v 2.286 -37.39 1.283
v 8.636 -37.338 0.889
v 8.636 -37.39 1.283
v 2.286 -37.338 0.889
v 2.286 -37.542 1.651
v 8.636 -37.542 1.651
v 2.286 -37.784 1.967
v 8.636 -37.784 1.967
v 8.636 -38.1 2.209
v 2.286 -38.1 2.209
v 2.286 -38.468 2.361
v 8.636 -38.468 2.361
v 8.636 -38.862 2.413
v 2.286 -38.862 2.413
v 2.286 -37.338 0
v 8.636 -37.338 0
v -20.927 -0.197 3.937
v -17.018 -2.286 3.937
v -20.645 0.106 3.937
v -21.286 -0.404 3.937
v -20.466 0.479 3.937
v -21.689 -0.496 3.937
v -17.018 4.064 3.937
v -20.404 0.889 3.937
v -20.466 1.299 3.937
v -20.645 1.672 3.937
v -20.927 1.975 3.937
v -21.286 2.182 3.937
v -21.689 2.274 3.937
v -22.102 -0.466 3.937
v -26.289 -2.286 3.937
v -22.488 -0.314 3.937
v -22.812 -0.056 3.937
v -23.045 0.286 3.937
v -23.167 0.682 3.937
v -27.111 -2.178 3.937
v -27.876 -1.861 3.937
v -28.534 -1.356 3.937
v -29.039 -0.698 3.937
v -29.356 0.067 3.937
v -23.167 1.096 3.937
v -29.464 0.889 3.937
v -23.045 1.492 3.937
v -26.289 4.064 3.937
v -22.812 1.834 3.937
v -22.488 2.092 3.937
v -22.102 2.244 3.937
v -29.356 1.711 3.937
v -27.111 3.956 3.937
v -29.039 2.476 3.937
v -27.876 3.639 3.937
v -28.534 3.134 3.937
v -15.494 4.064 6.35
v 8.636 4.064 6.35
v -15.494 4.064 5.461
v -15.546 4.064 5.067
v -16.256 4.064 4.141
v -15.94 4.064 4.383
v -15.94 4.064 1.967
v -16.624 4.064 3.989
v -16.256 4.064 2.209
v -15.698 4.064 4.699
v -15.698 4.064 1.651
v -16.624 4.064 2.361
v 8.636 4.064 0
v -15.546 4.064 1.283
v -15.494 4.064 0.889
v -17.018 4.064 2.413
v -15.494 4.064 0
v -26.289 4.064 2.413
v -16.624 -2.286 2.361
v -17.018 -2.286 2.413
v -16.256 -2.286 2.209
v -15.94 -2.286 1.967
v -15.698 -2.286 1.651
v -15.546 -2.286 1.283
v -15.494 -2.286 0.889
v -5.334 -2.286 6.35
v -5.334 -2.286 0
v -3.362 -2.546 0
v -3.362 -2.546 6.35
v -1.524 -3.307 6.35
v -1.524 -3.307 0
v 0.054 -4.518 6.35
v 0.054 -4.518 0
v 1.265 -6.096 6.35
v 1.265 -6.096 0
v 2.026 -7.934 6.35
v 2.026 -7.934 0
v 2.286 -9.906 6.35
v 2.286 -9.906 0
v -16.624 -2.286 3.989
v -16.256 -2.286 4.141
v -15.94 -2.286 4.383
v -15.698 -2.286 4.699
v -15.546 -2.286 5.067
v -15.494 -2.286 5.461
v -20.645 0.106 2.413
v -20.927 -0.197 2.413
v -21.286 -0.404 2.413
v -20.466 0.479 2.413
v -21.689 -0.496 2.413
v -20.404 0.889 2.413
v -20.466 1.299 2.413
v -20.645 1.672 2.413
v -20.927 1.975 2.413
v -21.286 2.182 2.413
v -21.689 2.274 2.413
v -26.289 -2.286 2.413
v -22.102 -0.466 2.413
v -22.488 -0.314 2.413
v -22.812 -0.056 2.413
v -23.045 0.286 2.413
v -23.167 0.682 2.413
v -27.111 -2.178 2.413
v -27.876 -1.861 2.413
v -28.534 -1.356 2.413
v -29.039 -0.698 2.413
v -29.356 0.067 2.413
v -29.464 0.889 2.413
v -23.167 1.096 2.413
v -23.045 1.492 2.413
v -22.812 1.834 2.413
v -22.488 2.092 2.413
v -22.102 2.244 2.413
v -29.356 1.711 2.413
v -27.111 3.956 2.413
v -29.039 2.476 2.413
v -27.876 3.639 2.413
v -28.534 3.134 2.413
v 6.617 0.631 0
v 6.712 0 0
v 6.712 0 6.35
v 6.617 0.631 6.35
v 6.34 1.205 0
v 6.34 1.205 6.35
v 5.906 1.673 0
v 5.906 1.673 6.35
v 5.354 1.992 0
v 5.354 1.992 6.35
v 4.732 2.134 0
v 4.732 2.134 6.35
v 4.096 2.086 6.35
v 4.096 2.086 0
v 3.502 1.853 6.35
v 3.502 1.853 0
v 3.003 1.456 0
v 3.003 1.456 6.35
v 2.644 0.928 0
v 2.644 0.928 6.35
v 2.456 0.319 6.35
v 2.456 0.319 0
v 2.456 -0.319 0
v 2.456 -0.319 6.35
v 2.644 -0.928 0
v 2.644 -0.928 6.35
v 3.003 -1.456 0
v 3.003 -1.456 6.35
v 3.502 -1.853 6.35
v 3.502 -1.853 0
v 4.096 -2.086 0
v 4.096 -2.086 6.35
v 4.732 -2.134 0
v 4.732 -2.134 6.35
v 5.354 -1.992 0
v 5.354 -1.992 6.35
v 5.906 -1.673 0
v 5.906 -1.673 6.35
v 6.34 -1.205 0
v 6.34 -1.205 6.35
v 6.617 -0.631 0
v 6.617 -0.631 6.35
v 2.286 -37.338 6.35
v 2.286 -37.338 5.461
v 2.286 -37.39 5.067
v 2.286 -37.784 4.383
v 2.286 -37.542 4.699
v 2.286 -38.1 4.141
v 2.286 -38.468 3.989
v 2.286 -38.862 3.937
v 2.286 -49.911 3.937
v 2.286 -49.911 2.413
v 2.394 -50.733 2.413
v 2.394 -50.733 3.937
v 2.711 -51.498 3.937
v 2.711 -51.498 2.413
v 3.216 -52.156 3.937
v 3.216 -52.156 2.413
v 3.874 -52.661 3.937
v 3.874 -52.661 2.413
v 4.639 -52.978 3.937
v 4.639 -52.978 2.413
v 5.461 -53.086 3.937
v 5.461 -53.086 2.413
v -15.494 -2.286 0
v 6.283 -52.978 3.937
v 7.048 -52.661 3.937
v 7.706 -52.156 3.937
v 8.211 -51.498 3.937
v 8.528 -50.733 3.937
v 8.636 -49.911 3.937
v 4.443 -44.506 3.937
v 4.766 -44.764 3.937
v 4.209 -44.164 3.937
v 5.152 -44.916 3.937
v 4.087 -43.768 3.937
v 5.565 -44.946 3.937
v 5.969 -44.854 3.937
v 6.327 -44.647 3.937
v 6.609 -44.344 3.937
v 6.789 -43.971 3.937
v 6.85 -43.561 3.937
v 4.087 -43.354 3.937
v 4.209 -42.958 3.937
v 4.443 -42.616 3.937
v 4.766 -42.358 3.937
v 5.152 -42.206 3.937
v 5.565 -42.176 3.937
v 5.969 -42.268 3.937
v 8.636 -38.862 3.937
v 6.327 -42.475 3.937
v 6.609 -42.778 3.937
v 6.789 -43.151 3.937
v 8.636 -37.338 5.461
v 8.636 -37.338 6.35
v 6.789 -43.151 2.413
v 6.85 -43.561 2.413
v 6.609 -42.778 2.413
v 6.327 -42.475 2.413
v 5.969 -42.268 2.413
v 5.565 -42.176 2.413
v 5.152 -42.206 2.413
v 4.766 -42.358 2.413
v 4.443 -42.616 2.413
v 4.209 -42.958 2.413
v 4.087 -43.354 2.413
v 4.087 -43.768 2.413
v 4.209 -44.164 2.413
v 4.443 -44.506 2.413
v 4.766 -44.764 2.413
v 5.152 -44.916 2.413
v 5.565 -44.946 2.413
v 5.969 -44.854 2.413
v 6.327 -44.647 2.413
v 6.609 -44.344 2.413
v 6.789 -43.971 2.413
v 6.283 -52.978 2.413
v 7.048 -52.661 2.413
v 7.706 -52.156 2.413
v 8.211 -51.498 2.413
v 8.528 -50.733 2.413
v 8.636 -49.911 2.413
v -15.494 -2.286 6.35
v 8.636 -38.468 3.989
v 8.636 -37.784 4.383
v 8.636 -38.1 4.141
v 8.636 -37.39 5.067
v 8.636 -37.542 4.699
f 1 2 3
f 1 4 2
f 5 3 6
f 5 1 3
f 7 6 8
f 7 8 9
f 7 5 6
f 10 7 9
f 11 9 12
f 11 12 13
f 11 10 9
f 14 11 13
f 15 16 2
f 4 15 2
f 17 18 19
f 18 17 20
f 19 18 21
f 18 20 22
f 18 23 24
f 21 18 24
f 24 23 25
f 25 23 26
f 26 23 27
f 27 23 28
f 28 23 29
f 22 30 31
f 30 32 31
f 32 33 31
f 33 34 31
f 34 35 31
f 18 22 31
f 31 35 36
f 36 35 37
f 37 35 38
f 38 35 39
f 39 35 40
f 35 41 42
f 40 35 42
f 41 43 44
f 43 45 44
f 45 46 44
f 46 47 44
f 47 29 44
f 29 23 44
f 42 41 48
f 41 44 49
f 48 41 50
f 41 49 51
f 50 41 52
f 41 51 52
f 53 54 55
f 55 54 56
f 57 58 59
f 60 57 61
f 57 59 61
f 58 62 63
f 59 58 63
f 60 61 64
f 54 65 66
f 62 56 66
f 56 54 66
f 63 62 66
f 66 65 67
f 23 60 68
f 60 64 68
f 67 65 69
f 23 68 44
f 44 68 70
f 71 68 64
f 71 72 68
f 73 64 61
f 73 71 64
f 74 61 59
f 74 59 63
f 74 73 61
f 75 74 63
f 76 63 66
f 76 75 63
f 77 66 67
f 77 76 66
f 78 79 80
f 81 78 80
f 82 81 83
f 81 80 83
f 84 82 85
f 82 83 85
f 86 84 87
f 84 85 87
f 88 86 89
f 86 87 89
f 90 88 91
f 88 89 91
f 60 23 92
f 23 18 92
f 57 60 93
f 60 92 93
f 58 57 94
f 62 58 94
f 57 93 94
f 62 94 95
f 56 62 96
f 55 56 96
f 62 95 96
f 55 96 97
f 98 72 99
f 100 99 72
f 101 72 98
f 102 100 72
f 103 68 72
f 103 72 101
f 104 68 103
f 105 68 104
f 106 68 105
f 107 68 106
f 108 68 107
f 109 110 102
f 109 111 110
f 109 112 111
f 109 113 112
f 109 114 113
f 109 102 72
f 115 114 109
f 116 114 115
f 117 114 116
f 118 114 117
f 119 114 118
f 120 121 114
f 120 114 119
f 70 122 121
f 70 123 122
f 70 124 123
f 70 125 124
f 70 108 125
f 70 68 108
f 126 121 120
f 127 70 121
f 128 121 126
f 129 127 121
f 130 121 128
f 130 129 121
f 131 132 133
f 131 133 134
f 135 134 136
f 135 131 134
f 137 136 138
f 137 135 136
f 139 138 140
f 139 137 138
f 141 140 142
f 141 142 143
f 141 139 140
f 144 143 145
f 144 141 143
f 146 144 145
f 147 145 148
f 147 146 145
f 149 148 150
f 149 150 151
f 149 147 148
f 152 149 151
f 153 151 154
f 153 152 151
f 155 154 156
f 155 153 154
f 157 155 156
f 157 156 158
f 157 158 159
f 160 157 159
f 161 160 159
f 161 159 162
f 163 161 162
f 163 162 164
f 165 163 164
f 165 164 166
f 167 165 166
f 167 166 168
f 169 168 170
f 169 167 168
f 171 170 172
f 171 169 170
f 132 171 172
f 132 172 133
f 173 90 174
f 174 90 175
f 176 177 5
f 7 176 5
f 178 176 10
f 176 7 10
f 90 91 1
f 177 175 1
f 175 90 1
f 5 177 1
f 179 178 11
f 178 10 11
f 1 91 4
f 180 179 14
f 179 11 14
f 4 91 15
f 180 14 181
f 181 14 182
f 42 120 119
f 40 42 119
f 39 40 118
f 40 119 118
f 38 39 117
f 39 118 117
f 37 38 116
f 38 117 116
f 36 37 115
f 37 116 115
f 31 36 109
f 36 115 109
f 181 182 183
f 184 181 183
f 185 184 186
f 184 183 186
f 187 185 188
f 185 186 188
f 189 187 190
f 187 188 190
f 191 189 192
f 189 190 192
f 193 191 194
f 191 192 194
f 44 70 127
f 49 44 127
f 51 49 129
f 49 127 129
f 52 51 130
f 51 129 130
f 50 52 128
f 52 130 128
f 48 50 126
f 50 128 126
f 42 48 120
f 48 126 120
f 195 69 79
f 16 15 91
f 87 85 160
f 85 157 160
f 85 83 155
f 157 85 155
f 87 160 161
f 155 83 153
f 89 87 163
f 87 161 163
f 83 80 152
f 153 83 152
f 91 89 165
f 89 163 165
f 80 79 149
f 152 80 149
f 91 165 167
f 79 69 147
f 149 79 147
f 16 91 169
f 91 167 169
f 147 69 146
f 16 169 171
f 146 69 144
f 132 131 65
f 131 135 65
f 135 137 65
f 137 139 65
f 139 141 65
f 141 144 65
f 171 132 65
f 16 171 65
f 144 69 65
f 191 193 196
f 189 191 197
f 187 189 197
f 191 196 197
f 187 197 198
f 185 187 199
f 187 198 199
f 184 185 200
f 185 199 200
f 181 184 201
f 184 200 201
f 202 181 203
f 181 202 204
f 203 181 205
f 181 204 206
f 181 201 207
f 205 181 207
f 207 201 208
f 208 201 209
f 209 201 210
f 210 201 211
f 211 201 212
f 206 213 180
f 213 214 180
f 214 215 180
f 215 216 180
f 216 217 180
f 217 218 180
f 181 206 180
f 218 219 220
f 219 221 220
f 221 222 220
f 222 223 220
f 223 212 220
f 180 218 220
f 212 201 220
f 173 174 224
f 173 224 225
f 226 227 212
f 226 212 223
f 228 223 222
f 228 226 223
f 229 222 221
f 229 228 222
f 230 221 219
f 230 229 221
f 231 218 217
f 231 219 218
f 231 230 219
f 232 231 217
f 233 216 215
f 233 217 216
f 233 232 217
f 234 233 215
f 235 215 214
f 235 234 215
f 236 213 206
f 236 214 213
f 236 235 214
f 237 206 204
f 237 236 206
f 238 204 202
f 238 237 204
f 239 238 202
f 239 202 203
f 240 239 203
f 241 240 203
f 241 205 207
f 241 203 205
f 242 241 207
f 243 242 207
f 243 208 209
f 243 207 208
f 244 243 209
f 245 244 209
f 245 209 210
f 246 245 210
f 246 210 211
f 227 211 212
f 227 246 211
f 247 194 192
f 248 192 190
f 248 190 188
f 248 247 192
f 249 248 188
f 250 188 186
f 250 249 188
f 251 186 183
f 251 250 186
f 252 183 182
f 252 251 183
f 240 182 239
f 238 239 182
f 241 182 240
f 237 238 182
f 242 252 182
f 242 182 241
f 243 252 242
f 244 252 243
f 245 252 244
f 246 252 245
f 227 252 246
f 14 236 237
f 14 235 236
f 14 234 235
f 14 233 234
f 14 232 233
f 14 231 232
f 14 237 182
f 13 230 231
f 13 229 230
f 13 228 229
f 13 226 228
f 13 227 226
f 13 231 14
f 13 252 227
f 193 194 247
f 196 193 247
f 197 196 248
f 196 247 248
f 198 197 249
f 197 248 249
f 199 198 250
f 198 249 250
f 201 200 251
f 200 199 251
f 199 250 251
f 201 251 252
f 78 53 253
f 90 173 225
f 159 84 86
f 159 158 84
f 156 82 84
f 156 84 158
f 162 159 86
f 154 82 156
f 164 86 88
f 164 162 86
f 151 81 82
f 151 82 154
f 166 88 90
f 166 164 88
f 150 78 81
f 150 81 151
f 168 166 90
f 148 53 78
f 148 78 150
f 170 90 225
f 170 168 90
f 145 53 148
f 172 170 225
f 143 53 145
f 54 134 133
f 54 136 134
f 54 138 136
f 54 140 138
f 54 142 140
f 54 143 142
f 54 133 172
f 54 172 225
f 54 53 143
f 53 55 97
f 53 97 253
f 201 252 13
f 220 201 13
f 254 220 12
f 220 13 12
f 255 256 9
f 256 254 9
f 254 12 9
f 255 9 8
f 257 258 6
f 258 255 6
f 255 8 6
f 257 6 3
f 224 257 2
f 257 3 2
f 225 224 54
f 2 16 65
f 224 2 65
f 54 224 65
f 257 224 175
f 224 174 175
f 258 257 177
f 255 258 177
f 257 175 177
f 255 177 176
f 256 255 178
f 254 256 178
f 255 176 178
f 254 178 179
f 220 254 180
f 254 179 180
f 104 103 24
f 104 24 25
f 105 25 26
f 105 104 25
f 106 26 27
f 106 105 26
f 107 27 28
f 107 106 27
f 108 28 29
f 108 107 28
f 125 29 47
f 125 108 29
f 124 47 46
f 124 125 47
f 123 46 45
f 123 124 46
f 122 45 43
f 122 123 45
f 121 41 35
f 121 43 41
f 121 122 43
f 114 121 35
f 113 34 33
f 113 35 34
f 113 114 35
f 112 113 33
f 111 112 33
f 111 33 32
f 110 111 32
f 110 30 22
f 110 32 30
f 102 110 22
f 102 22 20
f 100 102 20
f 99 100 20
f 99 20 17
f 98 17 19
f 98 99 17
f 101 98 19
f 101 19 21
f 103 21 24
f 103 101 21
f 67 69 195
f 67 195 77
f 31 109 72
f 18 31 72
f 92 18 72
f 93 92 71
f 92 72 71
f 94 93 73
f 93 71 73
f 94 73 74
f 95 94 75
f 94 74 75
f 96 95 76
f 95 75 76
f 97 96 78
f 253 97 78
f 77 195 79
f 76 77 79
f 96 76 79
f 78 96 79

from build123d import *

# Parameters (mm, degrees)
F0_R     = 1.38938
F0_R_2   = 2.13995
F1_DEPTH = 6.35
F2_W     = 17.878901
F2_H     = 3.15336
F2_H_2   = 3.638602
F3_DEPTH = 38.101
F4_W     = 17.966992
F4_H     = 2.413
F5_DEPTH = 57.151
F6_R     = 1.524


with BuildPart() as f1:
    # F0 (on Top) → F1 (new body)
    with BuildSketch(Plane.XY):
        with BuildLine():
            ThreePointArc((-29.464, 0.889), (-28.534064, -1.356064), (-26.289, -2.286))
            Line((-26.289, -2.286), (-5.334, -2.286))
            ThreePointArc((-5.334, -2.286), (0.054154, -4.517846), (2.286, -9.906))
            Line((2.286, -9.906), (2.286, -49.911))
            ThreePointArc((2.286, -49.911), (3.215936, -52.156064), (5.461, -53.086))
            ThreePointArc((5.461, -53.086), (7.706064, -52.156064), (8.636, -49.911))
            Line((8.636, -49.911), (8.636, 4.064))
            Line((8.636, 4.064), (-26.289, 4.064))
            ThreePointArc((-26.289, 4.064), (-28.534064, 3.134064), (-29.464, 0.889))
        make_face()
        with Locations((5.461, -43.561)):
            Circle(F0_R, mode=Mode.SUBTRACT)
        with Locations((-21.7932, 0.889)):
            Circle(F0_R, mode=Mode.SUBTRACT)
        with Locations((4.572, 0)):
            Circle(F0_R_2, mode=Mode.SUBTRACT)
    extrude(amount=F1_DEPTH)

    # F2 (on face) → F3 (cut, through all)
    with BuildSketch(Plane.YZ.offset(8.636)):
        with Locations((-46.277451, 5.51368)):
            Rectangle(F2_W, F2_H)
        with Locations((-46.277451, 0.593699)):
            Rectangle(F2_W, F2_H_2)
    extrude(amount=-F3_DEPTH, mode=Mode.SUBTRACT)

    # F4 (on face) → F5 (cut, through all)
    with BuildSketch(Plane(origin=(0, 4.064, 0), x_dir=(-1, 0, 0), z_dir=(0, 1, 0))):
        with Locations((24.477496, 5.1435)):
            Rectangle(F4_W, F4_H)
        with Locations((24.477496, 1.2065)):
            Rectangle(F4_W, F4_H)
    extrude(amount=-F5_DEPTH, mode=Mode.SUBTRACT)

    # F6
    f6_edges = [f1.edges().sort_by_distance(p)[0] for p in [
        (-15.494, 0.889, 3.937),
        (-15.494, 0.889, 2.413),
        (5.461, -37.338, 3.937),
        (5.461, -37.338, 2.413),
    ]]
    fillet(f6_edges, radius=F6_R)


solid = f1.part
